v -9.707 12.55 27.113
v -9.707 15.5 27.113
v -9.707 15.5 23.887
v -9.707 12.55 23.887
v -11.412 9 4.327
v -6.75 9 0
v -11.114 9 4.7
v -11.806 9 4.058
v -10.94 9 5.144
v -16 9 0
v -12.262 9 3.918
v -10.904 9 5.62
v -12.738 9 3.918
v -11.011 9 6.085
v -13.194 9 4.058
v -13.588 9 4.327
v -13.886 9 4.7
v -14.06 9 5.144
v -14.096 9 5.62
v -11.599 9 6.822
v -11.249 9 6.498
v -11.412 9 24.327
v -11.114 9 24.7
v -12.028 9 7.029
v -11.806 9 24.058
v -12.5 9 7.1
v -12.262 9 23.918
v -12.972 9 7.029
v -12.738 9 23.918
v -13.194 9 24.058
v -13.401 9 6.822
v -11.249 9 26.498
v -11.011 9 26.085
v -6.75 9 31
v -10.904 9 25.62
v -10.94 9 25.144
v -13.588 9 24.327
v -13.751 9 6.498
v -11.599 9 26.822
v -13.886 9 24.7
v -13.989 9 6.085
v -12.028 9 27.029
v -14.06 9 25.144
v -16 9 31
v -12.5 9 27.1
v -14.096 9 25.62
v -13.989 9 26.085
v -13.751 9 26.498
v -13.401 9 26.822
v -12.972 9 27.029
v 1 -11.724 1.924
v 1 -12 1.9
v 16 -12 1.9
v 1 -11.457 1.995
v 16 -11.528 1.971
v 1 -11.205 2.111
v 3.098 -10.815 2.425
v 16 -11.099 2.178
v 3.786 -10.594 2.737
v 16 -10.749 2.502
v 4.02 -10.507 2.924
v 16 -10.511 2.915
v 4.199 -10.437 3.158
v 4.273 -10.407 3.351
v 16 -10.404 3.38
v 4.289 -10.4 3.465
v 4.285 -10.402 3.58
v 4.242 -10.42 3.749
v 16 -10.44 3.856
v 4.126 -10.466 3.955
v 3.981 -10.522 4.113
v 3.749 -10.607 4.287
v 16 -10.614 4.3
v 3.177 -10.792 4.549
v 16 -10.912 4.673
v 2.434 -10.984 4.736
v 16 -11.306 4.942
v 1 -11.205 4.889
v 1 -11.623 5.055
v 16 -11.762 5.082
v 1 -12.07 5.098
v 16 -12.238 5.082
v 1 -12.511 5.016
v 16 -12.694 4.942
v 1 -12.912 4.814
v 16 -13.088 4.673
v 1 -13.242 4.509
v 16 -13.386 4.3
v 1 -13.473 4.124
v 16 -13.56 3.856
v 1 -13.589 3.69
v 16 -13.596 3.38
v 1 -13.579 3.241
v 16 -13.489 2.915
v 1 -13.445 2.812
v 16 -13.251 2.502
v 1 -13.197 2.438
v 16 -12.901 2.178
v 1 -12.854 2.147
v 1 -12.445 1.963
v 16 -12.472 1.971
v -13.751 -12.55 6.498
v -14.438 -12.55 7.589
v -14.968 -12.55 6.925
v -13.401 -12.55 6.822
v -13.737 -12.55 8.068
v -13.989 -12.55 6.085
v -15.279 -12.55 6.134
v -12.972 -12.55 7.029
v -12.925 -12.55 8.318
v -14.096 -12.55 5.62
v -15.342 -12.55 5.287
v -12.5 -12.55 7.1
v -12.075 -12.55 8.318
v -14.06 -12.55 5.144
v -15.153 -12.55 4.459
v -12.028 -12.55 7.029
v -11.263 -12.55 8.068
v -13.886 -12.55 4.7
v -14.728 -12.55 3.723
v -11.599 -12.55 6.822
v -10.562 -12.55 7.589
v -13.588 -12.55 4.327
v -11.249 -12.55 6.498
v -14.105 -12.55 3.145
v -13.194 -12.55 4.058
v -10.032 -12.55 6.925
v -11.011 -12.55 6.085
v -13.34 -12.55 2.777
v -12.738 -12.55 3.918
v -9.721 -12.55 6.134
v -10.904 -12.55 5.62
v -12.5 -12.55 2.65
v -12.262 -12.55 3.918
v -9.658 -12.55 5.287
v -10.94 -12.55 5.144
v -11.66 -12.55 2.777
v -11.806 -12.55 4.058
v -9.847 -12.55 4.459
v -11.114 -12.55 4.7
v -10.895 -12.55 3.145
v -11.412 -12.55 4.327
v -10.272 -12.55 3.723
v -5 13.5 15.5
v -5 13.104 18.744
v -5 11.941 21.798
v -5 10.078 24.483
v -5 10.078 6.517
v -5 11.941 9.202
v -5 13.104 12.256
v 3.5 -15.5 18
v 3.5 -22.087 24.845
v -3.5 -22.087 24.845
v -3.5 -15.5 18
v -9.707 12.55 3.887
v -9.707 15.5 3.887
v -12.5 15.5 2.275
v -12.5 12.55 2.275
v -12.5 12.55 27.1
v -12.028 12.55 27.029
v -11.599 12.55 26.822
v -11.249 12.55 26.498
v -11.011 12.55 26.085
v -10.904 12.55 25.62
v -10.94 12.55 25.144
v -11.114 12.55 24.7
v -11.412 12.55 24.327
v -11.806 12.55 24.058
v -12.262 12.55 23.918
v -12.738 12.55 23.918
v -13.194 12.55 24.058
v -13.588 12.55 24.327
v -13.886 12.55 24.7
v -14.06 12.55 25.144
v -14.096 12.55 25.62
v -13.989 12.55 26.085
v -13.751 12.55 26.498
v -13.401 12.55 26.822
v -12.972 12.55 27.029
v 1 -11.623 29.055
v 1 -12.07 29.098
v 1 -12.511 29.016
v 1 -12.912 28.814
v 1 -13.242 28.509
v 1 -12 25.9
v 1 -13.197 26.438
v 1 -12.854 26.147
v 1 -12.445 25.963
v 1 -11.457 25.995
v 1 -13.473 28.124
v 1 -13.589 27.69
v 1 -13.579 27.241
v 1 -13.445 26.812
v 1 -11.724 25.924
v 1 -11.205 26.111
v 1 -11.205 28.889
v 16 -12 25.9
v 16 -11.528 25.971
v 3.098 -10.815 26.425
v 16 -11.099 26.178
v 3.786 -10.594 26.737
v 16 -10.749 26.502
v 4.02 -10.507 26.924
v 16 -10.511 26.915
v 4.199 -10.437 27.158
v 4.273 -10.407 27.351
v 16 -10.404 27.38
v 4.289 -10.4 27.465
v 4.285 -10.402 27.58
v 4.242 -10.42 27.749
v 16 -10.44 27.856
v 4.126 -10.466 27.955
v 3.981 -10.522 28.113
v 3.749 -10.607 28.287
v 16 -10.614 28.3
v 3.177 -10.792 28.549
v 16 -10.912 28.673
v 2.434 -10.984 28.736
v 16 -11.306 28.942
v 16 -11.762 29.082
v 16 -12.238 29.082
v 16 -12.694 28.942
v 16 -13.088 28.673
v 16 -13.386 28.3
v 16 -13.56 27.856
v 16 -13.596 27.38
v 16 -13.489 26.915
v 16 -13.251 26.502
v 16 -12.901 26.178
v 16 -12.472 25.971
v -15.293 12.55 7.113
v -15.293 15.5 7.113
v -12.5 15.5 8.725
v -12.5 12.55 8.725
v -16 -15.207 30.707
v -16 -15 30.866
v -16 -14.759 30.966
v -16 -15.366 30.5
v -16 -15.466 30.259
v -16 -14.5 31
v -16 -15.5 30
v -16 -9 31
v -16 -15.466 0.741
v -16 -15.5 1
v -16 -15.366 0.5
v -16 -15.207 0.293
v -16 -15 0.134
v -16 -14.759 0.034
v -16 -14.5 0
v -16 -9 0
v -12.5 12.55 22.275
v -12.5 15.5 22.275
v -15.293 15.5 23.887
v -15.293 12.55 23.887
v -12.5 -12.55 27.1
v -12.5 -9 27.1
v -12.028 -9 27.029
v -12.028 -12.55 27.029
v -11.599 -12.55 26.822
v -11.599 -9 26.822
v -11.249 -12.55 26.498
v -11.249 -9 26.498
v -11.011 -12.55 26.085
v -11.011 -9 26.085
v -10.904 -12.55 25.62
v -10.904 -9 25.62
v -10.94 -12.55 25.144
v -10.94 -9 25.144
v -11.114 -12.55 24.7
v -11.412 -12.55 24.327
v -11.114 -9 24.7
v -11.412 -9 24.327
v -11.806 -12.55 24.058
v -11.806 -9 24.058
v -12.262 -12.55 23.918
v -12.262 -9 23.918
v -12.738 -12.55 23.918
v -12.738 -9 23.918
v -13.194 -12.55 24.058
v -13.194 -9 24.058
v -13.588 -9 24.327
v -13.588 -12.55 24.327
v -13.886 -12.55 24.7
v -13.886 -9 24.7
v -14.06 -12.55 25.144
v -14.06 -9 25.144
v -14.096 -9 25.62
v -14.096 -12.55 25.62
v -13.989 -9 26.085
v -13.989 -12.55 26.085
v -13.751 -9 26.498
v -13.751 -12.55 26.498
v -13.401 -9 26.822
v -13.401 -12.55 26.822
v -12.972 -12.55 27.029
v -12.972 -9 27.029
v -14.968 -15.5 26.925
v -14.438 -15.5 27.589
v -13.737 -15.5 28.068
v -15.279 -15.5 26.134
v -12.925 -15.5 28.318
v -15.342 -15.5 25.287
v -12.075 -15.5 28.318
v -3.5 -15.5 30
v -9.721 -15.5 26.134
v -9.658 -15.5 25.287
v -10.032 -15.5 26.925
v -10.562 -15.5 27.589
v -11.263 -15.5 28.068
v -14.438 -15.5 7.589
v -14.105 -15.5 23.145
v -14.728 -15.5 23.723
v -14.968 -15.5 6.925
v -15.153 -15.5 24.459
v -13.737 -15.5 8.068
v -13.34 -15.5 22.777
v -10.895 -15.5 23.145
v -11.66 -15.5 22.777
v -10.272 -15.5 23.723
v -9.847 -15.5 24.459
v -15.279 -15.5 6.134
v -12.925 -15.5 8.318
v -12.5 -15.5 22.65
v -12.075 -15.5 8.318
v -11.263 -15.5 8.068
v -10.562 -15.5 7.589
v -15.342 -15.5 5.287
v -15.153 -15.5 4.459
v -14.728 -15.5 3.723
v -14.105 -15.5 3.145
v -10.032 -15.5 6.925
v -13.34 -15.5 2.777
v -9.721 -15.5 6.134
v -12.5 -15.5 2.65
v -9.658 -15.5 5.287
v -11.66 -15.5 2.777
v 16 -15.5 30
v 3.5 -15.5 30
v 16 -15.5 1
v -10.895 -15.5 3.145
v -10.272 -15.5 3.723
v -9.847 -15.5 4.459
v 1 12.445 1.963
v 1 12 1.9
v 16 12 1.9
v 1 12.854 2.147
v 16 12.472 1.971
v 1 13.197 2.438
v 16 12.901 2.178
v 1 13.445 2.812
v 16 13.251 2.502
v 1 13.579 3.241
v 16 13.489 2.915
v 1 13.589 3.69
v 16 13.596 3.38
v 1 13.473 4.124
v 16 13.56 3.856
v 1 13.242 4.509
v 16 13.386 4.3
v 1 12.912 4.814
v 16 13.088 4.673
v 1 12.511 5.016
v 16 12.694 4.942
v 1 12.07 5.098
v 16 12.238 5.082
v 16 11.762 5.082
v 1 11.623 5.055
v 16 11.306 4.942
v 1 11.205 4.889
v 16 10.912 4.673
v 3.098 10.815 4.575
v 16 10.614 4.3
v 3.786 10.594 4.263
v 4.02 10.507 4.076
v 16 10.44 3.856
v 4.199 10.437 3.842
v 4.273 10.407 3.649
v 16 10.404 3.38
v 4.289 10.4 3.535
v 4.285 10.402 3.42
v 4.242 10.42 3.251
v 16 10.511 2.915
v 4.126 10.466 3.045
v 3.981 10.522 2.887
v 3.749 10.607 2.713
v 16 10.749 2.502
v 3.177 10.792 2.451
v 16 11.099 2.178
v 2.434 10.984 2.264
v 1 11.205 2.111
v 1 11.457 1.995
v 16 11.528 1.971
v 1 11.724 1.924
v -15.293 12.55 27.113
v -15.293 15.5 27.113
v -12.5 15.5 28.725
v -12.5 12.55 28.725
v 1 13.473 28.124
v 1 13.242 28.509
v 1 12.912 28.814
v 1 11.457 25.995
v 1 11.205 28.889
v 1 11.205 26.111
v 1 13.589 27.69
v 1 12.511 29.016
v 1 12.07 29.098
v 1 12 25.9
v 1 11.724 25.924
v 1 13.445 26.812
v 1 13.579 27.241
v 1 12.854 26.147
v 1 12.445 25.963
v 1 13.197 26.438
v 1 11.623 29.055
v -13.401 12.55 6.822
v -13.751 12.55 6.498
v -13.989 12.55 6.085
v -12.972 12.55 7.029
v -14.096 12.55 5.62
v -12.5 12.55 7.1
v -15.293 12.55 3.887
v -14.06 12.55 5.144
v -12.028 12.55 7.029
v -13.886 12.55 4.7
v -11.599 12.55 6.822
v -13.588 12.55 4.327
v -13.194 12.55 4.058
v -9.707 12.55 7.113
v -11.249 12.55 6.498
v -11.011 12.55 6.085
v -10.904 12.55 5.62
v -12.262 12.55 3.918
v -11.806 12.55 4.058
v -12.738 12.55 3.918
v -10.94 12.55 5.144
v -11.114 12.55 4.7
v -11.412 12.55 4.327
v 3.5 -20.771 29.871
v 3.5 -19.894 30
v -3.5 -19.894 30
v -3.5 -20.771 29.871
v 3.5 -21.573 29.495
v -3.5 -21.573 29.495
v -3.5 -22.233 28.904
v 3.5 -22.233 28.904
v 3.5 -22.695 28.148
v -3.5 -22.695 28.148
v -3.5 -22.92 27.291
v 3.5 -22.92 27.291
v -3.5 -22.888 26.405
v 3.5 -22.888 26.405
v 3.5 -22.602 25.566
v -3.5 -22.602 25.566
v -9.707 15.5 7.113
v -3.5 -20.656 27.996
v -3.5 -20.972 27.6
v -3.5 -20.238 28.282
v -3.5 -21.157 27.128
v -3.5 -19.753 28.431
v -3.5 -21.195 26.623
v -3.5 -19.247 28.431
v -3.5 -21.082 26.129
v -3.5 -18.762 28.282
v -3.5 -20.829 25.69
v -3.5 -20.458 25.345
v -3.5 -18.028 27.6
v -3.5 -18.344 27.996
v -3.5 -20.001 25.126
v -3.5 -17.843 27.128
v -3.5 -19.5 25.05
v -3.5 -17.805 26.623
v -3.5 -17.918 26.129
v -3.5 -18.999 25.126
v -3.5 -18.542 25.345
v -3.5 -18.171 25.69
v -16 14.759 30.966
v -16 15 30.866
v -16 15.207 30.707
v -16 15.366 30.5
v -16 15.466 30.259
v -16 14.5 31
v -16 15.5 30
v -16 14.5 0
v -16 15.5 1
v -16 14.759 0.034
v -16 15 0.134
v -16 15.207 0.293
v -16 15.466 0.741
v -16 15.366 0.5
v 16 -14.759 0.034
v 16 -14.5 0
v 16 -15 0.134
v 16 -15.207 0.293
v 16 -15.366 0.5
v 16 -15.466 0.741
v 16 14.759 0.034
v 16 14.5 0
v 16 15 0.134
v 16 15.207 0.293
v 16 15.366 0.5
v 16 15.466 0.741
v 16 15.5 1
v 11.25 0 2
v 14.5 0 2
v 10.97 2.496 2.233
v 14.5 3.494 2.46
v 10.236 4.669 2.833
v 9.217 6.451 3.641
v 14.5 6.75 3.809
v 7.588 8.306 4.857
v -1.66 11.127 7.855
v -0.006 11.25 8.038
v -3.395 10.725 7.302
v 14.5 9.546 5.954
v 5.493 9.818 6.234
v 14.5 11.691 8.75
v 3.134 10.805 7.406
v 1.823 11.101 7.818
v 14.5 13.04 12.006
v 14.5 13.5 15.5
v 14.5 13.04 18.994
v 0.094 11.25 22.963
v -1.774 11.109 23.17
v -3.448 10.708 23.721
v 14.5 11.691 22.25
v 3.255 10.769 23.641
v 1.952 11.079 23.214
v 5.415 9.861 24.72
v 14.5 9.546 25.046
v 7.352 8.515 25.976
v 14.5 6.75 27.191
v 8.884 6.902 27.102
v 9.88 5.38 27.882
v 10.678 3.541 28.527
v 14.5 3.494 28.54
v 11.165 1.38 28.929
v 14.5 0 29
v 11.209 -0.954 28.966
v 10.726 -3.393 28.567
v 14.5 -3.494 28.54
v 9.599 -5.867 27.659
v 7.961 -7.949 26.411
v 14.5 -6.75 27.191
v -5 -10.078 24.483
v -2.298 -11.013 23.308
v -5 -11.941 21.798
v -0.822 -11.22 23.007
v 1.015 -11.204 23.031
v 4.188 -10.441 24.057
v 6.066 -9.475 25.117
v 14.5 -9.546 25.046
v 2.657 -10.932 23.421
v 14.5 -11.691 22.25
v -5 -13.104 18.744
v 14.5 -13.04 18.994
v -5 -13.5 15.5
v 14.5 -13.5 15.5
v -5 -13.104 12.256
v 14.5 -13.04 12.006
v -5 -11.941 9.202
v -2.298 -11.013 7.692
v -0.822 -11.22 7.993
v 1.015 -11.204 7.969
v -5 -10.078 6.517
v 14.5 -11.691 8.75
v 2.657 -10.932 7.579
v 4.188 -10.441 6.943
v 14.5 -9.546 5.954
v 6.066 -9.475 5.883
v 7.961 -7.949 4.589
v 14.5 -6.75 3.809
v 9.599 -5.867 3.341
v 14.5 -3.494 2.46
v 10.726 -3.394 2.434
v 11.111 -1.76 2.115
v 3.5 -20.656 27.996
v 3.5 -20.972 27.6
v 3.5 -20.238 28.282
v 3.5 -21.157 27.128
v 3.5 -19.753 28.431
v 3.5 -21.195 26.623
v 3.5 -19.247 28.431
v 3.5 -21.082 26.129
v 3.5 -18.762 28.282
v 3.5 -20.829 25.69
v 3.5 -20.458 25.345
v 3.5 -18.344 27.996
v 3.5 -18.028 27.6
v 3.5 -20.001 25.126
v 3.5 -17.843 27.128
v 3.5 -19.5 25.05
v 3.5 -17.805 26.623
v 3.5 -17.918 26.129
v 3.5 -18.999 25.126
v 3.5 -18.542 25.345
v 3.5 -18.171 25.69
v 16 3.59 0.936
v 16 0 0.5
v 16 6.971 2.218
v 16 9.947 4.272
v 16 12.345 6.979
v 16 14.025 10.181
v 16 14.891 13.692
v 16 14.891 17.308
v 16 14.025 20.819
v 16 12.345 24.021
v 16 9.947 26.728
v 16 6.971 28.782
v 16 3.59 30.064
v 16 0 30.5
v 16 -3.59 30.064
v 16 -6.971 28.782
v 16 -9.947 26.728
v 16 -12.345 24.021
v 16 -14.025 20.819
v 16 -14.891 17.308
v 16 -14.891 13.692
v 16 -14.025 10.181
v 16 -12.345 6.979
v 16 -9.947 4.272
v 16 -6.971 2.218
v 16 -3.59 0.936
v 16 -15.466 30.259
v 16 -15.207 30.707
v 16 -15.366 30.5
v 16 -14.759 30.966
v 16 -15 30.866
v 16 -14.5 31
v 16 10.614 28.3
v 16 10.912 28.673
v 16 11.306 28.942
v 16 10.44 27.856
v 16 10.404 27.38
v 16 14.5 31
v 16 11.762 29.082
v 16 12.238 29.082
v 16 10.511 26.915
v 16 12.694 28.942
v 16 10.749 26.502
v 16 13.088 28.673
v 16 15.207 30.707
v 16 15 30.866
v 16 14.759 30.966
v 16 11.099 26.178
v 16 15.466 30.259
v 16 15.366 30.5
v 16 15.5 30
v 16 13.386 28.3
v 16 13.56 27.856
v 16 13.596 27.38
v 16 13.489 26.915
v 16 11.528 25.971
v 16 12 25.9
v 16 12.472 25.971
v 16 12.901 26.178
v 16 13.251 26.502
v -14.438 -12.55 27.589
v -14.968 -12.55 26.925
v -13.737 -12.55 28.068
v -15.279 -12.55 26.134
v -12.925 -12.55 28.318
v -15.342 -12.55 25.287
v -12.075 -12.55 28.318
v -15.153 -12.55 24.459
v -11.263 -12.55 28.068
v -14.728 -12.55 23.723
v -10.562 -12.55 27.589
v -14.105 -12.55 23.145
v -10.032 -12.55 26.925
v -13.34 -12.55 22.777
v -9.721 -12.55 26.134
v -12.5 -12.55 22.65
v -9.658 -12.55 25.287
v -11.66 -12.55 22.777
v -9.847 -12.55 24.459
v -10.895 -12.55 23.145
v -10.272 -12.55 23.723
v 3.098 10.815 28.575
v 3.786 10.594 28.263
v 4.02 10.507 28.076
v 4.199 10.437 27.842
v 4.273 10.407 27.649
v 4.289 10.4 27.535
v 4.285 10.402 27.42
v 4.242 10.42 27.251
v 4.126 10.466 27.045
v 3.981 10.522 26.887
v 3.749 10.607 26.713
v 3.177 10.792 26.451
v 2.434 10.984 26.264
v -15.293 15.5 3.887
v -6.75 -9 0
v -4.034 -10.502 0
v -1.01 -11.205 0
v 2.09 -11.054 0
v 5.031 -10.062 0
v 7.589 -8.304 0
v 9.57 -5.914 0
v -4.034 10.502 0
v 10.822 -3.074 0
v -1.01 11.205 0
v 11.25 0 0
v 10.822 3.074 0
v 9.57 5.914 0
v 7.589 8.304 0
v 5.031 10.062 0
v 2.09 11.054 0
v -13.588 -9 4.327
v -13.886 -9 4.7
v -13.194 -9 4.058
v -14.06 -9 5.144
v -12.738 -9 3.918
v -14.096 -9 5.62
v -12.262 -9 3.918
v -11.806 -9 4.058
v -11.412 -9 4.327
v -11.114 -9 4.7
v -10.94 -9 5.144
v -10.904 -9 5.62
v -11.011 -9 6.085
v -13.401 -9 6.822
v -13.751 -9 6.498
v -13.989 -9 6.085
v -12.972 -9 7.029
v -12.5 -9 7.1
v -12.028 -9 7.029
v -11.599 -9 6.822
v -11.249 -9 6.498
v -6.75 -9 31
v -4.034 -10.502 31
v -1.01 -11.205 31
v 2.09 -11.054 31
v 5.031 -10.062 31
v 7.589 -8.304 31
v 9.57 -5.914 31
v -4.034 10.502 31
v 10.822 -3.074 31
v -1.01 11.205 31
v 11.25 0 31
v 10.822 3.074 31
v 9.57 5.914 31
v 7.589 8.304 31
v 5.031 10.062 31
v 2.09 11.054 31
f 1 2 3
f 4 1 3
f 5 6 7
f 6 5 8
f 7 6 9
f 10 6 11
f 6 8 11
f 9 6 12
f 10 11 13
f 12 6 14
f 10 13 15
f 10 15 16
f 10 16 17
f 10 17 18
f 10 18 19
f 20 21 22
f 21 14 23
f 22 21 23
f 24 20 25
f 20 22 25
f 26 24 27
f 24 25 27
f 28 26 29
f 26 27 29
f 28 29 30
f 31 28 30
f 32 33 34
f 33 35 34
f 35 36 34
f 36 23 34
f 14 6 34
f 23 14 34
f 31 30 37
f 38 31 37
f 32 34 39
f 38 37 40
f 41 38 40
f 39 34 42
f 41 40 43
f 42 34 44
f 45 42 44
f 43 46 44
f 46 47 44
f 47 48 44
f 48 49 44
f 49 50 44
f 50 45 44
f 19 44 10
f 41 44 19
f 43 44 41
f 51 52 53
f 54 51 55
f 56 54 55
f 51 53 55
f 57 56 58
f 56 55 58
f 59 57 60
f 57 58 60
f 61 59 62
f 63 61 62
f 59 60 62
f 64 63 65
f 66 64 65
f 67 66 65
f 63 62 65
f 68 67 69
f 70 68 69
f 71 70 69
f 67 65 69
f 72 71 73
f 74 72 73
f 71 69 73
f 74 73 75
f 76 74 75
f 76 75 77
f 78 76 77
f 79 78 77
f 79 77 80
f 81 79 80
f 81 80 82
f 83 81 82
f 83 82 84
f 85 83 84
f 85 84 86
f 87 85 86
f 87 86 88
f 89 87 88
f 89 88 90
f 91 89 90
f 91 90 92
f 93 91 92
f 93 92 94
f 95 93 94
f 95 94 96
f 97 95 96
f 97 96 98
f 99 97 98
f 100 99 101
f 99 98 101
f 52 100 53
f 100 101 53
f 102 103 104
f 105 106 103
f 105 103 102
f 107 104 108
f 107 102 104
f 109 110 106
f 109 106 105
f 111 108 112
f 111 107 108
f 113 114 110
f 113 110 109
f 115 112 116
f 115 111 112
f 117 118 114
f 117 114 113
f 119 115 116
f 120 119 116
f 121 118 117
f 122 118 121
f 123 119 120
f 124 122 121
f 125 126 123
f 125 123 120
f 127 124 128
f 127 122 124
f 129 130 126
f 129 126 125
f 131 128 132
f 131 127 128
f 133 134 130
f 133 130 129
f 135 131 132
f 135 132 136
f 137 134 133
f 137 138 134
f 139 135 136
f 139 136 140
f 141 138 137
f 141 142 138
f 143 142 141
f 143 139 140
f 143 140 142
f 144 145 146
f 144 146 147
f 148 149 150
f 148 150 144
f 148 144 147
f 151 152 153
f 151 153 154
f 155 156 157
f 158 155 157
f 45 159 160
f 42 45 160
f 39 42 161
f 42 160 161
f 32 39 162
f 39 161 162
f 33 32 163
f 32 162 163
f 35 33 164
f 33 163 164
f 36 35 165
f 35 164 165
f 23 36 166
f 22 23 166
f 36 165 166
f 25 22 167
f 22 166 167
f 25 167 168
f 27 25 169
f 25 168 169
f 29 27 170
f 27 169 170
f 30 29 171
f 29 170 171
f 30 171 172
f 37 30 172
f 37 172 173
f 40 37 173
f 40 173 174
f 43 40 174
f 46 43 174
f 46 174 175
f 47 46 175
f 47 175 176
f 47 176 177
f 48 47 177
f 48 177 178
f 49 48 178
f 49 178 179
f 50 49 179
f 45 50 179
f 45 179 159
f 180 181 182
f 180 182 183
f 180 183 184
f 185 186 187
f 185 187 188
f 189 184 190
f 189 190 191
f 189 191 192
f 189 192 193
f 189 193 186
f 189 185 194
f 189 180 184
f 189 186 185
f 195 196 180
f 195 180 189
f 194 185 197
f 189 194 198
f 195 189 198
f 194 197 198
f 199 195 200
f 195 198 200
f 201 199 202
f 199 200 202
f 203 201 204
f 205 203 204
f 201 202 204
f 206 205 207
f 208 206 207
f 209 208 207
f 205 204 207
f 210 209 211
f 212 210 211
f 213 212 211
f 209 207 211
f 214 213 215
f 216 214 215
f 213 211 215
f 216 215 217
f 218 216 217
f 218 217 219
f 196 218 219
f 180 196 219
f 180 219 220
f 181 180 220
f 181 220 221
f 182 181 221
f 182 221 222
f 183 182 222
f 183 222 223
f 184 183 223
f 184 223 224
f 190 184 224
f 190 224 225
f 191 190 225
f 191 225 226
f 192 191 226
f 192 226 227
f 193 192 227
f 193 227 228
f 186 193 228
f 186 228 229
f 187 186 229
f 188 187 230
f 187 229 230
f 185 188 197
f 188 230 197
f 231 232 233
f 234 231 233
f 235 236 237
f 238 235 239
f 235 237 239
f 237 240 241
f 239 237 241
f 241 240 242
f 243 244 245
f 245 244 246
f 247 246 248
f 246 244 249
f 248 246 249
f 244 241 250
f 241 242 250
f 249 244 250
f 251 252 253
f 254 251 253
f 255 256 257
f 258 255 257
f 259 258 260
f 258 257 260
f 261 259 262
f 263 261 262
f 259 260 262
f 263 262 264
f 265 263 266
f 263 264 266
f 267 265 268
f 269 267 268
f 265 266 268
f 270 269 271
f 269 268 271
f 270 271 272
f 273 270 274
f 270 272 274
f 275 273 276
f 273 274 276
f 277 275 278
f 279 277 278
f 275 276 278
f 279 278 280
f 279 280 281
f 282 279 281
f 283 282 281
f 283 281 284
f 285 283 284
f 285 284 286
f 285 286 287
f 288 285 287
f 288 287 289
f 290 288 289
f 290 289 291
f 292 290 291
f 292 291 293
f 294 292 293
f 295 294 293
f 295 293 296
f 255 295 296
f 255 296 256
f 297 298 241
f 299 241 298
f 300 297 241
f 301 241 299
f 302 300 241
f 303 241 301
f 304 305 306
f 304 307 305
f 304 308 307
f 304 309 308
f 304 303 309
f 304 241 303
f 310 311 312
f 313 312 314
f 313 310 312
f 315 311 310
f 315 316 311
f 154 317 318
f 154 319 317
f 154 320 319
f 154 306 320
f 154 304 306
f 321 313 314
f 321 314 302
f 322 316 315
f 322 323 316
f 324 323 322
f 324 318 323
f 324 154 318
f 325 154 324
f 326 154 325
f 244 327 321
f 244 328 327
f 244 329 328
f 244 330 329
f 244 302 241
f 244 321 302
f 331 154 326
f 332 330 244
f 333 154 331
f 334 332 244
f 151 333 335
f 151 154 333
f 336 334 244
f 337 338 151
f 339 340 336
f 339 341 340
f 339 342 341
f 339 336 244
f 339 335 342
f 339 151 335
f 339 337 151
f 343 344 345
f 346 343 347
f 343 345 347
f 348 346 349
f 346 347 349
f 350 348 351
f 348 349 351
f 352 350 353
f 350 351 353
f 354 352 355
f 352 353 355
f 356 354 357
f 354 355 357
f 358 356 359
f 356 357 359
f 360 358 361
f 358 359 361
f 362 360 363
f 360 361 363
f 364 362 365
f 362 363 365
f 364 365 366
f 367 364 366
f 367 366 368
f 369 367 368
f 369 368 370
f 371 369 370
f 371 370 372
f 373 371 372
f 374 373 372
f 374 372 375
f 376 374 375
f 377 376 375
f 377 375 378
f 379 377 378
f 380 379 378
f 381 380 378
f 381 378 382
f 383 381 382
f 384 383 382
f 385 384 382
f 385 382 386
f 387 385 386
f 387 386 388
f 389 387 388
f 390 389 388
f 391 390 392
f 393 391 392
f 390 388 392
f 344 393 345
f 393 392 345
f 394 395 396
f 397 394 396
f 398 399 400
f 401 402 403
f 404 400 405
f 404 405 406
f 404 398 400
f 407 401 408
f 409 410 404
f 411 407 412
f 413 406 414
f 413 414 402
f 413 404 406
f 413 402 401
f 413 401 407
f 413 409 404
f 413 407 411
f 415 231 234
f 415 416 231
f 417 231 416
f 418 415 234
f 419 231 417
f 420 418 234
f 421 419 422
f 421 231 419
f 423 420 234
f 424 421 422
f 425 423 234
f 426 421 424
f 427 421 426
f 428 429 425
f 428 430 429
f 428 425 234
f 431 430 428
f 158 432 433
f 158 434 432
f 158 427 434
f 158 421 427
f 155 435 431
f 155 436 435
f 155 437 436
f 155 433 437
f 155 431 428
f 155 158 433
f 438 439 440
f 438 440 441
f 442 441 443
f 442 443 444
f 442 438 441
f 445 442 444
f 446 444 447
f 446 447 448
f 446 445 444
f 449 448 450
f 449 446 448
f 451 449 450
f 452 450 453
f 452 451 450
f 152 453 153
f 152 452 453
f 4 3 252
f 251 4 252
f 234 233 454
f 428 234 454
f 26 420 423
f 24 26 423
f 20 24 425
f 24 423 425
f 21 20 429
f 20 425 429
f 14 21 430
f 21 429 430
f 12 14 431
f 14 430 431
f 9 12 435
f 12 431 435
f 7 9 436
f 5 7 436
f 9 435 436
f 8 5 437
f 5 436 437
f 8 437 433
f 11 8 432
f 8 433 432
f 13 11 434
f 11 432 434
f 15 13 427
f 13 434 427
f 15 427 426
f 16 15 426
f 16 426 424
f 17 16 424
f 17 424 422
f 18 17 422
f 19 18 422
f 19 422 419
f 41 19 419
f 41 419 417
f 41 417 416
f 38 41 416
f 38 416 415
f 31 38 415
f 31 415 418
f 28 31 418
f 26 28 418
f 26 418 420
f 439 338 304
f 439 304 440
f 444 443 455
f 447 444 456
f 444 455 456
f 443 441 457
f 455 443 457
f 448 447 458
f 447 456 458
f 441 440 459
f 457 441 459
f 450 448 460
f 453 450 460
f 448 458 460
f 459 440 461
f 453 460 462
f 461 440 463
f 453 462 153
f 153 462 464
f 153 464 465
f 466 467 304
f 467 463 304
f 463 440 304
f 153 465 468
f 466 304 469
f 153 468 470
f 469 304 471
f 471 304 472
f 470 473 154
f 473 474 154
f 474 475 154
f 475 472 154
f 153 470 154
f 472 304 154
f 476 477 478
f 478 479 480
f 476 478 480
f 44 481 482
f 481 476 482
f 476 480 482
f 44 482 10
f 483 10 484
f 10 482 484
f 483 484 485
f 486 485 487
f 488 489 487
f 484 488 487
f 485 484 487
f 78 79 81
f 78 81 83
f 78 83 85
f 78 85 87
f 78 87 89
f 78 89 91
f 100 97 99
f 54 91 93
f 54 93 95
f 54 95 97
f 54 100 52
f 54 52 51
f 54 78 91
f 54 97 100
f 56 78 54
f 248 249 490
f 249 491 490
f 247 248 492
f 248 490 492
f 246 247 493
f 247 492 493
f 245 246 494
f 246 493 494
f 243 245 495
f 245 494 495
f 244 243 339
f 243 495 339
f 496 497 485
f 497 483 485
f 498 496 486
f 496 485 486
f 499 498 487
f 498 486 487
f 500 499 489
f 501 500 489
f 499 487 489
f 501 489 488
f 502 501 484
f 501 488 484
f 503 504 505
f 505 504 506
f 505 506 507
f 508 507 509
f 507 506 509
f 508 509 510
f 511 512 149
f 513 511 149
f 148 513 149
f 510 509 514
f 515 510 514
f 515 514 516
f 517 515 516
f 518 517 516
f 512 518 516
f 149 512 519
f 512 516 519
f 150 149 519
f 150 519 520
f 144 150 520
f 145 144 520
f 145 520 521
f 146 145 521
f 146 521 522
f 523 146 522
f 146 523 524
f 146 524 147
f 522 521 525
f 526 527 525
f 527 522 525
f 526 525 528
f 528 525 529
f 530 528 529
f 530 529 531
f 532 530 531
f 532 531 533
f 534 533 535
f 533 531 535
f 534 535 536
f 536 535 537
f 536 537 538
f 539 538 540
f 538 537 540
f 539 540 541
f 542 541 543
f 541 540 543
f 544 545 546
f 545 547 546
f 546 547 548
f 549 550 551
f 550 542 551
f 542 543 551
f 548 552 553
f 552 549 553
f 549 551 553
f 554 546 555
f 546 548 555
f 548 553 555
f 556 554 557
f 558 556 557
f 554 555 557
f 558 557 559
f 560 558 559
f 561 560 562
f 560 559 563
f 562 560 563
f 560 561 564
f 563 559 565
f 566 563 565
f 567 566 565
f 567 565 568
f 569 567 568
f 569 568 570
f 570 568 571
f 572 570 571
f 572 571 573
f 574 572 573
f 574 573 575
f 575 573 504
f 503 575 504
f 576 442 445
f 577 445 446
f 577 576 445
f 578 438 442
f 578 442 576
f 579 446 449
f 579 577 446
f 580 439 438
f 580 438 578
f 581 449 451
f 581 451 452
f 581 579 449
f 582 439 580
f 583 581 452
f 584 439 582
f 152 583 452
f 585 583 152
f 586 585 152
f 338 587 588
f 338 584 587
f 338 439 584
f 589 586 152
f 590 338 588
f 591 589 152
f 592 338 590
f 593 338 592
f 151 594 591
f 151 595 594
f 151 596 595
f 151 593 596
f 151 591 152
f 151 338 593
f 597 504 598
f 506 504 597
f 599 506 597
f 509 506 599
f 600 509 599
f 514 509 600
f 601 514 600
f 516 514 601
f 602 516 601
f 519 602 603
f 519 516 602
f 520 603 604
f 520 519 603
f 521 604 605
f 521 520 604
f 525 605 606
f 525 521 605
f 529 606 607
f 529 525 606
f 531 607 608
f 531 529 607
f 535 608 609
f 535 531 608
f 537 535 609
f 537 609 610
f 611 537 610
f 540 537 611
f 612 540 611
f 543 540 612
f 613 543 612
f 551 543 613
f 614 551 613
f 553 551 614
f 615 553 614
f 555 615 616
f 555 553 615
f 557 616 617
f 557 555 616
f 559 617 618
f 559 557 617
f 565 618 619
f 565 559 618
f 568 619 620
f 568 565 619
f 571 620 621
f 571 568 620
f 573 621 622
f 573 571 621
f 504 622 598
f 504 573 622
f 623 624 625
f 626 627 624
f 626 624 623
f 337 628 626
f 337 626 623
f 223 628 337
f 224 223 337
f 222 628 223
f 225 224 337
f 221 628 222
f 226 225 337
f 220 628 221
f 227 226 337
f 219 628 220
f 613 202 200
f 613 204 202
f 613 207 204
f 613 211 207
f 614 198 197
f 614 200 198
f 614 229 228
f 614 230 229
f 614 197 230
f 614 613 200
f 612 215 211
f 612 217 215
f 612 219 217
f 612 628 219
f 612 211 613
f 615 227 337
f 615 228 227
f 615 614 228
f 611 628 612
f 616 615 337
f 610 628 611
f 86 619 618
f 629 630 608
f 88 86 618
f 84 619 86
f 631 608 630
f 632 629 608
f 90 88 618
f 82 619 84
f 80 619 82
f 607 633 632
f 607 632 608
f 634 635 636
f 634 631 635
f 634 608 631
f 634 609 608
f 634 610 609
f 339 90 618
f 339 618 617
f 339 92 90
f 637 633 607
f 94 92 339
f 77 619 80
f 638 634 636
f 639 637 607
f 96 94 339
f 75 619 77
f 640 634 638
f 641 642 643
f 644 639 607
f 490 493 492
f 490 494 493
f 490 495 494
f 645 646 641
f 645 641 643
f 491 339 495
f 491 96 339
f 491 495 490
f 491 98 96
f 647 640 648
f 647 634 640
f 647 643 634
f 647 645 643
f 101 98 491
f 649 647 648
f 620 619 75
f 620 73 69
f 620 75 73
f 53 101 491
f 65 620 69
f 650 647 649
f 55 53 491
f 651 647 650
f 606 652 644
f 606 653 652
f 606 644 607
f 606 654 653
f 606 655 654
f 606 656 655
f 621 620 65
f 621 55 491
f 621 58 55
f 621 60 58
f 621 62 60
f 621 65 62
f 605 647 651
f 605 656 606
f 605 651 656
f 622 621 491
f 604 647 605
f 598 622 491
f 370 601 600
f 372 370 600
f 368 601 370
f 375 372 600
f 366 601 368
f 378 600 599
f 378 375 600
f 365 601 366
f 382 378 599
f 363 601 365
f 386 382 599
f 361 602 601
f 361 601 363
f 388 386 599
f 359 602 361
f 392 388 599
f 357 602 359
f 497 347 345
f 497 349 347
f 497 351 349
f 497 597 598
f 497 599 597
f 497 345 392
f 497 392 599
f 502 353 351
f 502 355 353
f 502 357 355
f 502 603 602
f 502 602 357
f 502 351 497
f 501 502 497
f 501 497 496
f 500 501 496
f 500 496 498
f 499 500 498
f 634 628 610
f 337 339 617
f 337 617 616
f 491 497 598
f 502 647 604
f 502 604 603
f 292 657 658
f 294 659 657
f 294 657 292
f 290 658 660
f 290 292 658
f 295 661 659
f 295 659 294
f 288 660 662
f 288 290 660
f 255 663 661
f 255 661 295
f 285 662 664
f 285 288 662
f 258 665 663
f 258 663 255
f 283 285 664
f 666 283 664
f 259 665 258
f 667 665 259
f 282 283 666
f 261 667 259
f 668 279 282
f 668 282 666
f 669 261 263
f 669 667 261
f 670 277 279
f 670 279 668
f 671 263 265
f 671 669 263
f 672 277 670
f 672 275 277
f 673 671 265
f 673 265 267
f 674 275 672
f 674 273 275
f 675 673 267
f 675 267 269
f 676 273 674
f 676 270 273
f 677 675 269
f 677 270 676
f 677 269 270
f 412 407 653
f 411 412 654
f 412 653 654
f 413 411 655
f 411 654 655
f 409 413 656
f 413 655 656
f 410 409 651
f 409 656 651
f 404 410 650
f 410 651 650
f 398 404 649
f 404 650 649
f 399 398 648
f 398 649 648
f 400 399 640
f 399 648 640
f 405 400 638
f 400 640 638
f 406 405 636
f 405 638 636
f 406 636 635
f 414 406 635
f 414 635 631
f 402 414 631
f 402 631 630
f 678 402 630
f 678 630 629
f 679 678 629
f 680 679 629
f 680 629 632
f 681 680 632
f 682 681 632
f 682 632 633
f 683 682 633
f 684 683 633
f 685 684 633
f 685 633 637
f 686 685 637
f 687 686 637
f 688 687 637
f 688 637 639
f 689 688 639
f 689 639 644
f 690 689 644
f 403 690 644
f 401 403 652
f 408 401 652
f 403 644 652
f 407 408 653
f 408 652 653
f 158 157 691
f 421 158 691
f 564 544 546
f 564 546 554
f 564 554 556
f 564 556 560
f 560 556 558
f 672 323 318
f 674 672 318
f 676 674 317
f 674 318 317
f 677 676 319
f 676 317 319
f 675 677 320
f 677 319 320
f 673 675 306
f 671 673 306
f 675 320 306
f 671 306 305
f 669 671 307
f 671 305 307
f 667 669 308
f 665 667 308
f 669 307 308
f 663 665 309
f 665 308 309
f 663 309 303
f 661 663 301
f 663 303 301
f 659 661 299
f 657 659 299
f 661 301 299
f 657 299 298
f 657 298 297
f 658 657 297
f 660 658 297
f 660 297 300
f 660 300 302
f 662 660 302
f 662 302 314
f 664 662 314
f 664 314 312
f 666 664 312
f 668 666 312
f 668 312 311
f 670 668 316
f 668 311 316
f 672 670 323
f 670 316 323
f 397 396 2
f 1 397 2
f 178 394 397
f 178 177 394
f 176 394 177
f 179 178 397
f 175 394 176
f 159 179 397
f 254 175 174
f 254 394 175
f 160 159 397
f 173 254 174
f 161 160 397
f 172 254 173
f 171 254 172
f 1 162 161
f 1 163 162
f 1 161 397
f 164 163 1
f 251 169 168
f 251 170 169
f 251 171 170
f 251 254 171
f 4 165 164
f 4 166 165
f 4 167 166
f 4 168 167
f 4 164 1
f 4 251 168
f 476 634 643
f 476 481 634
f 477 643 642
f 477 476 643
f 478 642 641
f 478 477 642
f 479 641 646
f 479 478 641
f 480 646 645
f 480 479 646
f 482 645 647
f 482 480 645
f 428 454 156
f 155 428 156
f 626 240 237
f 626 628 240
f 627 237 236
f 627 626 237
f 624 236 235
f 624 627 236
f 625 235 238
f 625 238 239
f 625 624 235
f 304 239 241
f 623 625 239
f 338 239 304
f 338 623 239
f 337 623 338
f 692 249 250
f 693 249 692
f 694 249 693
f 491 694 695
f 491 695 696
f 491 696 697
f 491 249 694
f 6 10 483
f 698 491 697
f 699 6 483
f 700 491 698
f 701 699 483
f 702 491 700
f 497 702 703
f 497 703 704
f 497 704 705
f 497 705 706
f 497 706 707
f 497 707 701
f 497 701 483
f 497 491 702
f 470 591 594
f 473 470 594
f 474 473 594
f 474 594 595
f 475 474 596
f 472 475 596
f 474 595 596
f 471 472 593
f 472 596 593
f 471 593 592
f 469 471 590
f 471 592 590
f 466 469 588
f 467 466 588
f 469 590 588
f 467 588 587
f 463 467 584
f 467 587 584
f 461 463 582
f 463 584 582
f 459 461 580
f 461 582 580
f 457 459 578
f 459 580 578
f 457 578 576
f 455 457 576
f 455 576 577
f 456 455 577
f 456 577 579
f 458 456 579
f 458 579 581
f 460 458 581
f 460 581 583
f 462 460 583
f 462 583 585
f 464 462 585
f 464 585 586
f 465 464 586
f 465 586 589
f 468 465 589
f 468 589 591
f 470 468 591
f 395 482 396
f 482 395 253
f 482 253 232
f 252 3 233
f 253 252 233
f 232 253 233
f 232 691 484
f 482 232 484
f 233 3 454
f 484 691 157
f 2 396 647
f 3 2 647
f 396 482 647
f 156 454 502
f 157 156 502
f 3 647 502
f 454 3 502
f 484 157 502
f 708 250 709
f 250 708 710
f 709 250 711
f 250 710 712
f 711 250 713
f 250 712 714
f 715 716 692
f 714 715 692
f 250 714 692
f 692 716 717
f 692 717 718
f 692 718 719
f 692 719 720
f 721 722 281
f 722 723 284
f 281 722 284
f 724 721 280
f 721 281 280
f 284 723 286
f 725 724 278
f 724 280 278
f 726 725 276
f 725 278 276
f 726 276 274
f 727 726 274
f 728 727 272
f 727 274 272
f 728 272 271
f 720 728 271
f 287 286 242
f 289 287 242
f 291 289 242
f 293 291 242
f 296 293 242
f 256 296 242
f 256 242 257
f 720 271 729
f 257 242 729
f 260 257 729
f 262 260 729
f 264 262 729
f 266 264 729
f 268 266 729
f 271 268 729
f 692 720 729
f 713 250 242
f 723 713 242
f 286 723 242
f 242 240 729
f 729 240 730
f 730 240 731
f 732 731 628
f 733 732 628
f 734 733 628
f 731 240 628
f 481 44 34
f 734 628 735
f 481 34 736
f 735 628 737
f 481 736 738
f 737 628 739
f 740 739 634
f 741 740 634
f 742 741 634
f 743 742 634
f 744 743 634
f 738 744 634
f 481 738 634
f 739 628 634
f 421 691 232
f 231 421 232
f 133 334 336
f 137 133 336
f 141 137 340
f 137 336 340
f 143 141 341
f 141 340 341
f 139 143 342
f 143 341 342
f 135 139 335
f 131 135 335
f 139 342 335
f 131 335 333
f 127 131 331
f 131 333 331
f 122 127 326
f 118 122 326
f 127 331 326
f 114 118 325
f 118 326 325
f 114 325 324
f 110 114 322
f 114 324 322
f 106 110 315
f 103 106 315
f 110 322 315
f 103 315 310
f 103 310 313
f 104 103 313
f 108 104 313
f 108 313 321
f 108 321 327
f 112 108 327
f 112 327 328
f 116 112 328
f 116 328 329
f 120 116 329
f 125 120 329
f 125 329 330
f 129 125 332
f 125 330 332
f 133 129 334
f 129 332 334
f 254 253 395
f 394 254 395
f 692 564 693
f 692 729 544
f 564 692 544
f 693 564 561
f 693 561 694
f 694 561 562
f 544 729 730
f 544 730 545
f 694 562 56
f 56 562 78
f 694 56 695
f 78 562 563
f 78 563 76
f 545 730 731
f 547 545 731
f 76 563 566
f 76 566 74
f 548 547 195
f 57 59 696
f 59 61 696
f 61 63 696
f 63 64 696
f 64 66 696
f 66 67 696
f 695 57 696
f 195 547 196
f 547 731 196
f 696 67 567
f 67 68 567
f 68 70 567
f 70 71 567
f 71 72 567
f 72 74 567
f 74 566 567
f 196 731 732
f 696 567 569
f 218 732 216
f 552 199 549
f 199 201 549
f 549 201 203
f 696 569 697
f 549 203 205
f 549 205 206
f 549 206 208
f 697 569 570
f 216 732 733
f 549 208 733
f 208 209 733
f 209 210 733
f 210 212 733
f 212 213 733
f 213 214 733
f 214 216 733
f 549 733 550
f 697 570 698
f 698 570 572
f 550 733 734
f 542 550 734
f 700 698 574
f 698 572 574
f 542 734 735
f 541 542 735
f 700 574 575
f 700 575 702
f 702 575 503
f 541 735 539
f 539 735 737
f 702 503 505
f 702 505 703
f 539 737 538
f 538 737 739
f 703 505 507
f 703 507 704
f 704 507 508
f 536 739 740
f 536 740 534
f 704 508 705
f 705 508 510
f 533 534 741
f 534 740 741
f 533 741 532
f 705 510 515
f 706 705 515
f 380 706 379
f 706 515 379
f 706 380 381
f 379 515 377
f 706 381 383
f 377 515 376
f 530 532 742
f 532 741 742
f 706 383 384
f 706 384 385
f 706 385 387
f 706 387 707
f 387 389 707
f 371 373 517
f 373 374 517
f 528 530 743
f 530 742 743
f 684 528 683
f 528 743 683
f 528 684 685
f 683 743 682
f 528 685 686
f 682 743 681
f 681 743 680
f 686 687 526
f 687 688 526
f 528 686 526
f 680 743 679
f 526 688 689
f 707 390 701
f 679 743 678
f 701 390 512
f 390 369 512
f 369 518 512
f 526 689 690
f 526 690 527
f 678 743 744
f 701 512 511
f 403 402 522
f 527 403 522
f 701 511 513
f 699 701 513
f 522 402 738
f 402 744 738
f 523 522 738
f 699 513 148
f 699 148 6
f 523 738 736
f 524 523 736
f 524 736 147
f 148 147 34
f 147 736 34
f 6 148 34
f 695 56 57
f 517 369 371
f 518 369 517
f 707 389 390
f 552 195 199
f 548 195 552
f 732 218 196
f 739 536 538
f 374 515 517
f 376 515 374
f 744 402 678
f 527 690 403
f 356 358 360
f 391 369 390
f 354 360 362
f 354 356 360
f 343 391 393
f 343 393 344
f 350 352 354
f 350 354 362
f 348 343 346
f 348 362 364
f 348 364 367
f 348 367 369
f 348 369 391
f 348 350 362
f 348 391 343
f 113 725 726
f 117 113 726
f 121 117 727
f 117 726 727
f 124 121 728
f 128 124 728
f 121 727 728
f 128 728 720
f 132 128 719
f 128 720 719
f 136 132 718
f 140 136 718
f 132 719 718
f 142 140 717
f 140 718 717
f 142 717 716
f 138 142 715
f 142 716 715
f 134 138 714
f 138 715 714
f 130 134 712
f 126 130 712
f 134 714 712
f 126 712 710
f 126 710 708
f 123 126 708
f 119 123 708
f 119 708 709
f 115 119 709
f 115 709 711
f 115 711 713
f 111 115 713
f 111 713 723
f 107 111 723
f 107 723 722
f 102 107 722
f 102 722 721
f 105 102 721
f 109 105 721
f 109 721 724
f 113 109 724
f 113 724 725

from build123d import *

# Parameters (mm, degrees)
SKETCH1_W           = 31
SKETCH1_H           = 31
BOSS_EXTRUDE1_DEPTH = 16
FILLET1_R           = 1
SKETCH2_R           = 13.5
CUT_EXTRUDE1_DEPTH  = 21
SKETCH3_R           = 1.6
CUT_EXTRUDE2_DEPTH  = 15
CUT_EXTRUDE3_DEPTH  = 39.173943993
SKETCH5_R           = 1.6
CUT_EXTRUDE4_DEPTH  = 47.669047659
CUT_EXTRUDE5_DEPTH  = 2.95
SKETCH7_R           = 2.85
CUT_EXTRUDE6_DEPTH  = 2.95
BOSS_EXTRUDE2_START = -12.5
BOSS_EXTRUDE2_DEPTH = 7
SKETCH9_R           = 1.70000037
CUT_EXTRUDE7_DEPTH  = 44.213437626
CHAMFER1_SIZE       = 1.5


with BuildPart() as part:
    # Sketch1 → Boss-Extrude1 (new, symmetric)
    with BuildSketch(Plane(origin=(0, 0, 0), x_dir=(0, 0, -1), z_dir=(1, 0, 0))):
        with Locations((-15.5, 0)):
            Rectangle(SKETCH1_W, SKETCH1_H)
    extrude(amount=BOSS_EXTRUDE1_DEPTH, both=True)

    # Fillet1
    fillet1_edges = [part.edges().sort_by_distance(p)[0] for p in [
        (0, -15.5, 0),
        (0, -15.5, 31),
        (0, 15.5, 31),
        (0, 15.5, 0),
    ]]
    fillet(fillet1_edges, radius=FILLET1_R)

    # Sketch2 → Cut-Extrude1 (cut)
    with BuildSketch(Plane(origin=(16, 0, 0), x_dir=(0, 0, -1), z_dir=(1, 0, 0))):
        with Locations((-15.5, 0)):
            Circle(SKETCH2_R)
    extrude(amount=-CUT_EXTRUDE1_DEPTH, mode=Mode.SUBTRACT)

    # Sketch3 → Cut-Extrude2 (cut)
    with BuildSketch(Plane(origin=(16, 0, 0), x_dir=(0, 0, -1), z_dir=(1, 0, 0))):
        with Locations((-27.5, 12)):
            Circle(SKETCH3_R)
        with Locations((-3.5, 12)):
            Circle(SKETCH3_R)
        with Locations((-3.5, -12)):
            Circle(SKETCH3_R)
        with Locations((-27.5, -12)):
            Circle(SKETCH3_R)
    extrude(amount=-CUT_EXTRUDE2_DEPTH, mode=Mode.SUBTRACT)

    # Sketch4 → Cut-Extrude3 (cut, through all)
    with BuildSketch(Plane.XY.offset(31)):
        with BuildLine():
            Line((-6.75, 9), (-16, 9))
            Line((-16, 9), (-16, -9))
            Line((-16, -9), (-6.75, -9))
            ThreePointArc((-6.75, -9), (11.25, 0), (-6.75, 9))
        make_face()
    extrude(amount=-CUT_EXTRUDE3_DEPTH, mode=Mode.SUBTRACT)

    # Sketch5 → Cut-Extrude4 (cut, through all)
    with BuildSketch(Plane(origin=(0, 15.5, 0), x_dir=(1, 0, 0), z_dir=(0, 1, 0))):
        with Locations(Location((-12.5, -5.5, 0), (0, 0, 270))):
            Circle(SKETCH5_R)
        with Locations(Location((-12.5, -25.5, 0), (0, 0, 270))):
            Circle(SKETCH5_R)
    extrude(amount=-CUT_EXTRUDE4_DEPTH, mode=Mode.SUBTRACT)

    # Sketch6 → Cut-Extrude5 (cut)
    with BuildSketch(Plane(origin=(0, 15.5, 0), x_dir=(1, 0, 0), z_dir=(0, 1, 0))):
        Polygon((-12.5, -8.725425014), (-9.7067, -7.112712507), (-9.7067, -3.887287493), (-12.5, -2.274574986), (-15.2933, -3.887287493), (-15.2933, -7.112712507), align=None)
        Polygon((-9.7067, -27.112712507), (-9.7067, -23.887287493), (-12.5, -22.274574986), (-15.2933, -23.887287493), (-15.2933, -27.112712507), (-12.5, -28.725425014), align=None)
    extrude(amount=-CUT_EXTRUDE5_DEPTH, mode=Mode.SUBTRACT)

    # Sketch7 → Cut-Extrude6 (cut)
    with BuildSketch(Plane.XZ.offset(15.5)):
        with Locations(Location((-12.5, 25.5, 0), (0, 0, 270))):
            Circle(SKETCH7_R)
        with Locations(Location((-12.5, 5.5, 0), (0, 0, 270))):
            Circle(SKETCH7_R)
    extrude(amount=-CUT_EXTRUDE6_DEPTH, mode=Mode.SUBTRACT)

    # Sketch8 → Boss-Extrude2 (add)
    with BuildSketch(Plane(origin=(16, 0, 0), x_dir=(0, 0, -1), z_dir=(1, 0, 0)).offset(BOSS_EXTRUDE2_START)):
        with BuildLine():
            Line((-30, -15.5), (-30, -19.893951988))
            ThreePointArc((-30, -19.893951988), (-28.14780731, -22.694961806), (-24.845223874, -22.087329999))
            Line((-24.845223874, -22.087329999), (-18, -15.5))
            Line((-18, -15.5), (-30, -15.5))
        make_face()
    extrude(amount=-BOSS_EXTRUDE2_DEPTH)

    # Sketch9 → Cut-Extrude7 (cut, through all)
    with BuildSketch(Plane(origin=(3.5, 0, 0), x_dir=(0, 0, -1), z_dir=(1, 0, 0))):
        with Locations((-26.749999873, -19.500000979)):
            Circle(SKETCH9_R)
    extrude(amount=-CUT_EXTRUDE7_DEPTH, mode=Mode.SUBTRACT)

    # Chamfer1
    chamfer1_edges = [part.edges().sort_by_distance(p)[0] for p in [
        (16, 0, 29),
    ]]
    chamfer(chamfer1_edges, length=CHAMFER1_SIZE)


solid = part.part
